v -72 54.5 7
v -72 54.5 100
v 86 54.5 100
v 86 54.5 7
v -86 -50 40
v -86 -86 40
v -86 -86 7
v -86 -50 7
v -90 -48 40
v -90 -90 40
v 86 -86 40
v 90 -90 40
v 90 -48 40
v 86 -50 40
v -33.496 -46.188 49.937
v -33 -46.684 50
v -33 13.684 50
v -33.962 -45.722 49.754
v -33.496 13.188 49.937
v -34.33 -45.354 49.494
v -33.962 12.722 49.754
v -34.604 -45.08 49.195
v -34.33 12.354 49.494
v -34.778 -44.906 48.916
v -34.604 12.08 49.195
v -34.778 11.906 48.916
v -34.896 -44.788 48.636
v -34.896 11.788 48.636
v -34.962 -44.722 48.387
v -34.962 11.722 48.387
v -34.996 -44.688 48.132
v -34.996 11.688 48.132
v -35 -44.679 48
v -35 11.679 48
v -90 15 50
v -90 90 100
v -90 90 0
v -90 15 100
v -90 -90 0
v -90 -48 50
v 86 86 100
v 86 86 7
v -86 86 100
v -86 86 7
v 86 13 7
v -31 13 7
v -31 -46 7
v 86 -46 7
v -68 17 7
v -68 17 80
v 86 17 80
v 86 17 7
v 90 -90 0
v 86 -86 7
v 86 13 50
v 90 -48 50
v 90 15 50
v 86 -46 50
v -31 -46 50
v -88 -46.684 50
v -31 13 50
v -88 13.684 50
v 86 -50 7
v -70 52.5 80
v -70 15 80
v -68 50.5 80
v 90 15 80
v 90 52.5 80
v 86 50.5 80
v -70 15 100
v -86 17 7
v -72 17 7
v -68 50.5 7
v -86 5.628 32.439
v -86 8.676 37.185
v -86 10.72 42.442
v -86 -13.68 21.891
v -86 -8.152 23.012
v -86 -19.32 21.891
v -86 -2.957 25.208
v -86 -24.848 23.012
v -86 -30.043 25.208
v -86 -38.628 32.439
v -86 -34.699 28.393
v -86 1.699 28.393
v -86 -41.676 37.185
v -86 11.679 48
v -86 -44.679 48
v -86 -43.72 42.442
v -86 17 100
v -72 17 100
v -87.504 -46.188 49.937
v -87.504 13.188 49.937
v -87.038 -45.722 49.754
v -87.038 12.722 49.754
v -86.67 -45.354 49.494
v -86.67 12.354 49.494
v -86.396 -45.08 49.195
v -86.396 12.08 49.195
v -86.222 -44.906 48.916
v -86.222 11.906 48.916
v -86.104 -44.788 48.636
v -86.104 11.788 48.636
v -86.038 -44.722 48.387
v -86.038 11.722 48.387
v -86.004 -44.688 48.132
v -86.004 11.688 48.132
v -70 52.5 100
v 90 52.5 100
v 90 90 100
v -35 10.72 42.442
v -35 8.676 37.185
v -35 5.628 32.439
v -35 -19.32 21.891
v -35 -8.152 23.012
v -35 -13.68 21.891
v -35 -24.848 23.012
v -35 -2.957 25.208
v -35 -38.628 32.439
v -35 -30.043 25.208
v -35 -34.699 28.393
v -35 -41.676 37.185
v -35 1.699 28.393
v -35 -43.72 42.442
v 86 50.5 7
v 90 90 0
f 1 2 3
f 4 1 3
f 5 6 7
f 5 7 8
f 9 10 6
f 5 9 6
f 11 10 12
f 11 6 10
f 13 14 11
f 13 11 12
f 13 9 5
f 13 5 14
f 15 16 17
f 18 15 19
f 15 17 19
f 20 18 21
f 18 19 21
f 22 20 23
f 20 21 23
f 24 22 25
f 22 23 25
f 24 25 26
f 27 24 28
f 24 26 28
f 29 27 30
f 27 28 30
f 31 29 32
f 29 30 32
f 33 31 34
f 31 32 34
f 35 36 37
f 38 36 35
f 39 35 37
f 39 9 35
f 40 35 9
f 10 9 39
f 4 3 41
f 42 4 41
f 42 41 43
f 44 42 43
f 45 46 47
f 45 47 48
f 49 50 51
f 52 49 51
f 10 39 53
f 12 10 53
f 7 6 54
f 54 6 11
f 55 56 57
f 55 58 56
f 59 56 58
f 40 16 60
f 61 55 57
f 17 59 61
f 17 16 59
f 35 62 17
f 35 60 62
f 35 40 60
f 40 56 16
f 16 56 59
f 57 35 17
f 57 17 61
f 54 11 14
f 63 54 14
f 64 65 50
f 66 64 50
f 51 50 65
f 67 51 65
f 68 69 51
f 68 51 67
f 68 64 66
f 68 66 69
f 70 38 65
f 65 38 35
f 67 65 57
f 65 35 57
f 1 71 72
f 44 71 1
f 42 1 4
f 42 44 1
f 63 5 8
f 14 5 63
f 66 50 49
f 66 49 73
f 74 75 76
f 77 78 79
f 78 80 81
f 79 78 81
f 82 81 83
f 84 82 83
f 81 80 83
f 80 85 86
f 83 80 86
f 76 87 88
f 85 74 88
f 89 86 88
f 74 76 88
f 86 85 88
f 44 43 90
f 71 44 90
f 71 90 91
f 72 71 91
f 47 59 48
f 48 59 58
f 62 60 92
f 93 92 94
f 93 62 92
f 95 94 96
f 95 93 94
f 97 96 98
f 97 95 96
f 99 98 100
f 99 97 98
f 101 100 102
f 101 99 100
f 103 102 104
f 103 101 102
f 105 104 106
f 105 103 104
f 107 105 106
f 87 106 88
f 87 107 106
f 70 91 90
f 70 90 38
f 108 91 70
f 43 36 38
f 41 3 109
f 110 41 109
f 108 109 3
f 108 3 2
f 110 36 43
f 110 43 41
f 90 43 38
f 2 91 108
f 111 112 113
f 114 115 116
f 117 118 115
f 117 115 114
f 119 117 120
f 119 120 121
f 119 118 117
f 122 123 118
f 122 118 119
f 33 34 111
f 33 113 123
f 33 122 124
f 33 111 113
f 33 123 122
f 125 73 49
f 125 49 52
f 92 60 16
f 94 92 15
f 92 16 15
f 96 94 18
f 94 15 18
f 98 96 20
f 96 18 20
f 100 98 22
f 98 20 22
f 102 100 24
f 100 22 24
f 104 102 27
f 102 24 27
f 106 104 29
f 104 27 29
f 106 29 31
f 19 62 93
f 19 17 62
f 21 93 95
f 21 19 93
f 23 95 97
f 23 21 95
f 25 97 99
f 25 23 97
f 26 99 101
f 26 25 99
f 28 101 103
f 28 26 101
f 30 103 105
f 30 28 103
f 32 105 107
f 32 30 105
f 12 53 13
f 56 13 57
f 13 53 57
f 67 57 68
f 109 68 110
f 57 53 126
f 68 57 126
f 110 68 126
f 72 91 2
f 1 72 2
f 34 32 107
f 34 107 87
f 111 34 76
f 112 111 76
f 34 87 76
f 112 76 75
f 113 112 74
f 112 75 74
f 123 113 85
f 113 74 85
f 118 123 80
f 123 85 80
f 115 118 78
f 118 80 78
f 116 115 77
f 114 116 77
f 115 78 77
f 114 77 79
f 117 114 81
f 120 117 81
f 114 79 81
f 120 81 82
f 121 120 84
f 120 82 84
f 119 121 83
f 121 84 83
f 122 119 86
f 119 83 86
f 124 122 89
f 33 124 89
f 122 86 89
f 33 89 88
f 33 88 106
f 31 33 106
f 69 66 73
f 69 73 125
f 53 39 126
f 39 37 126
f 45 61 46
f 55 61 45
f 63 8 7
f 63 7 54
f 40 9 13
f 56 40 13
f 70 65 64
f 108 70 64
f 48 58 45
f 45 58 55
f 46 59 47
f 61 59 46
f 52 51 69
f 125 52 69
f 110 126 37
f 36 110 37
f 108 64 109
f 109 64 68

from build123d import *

# Parameters (mm, degrees)
F0_W      = 70
F0_H      = 37.5
F0_W_2    = 90
F1_DEPTH  = 100
F2_DEPTH  = 80
F3_DEPTH  = 50
F0_W_3    = 180
F0_H_2    = 42
F4_DEPTH  = 40
F7_DEPTH  = 55
F8_DEPTH  = 4
F10_R     = 2
F11_W     = 154
F11_H     = 33.5
F11_W_2   = 117
F11_H_2   = 59
F11_W_3   = 172
F11_H_3   = 36
F12_DEPTH = 93


with BuildPart() as f1:
    # F0 (on Top) → F1 (new body)
    with BuildSketch(Plane.XY):
        with Locations((-35, 71.25)):
            Rectangle(F0_W, F0_H)
        with Locations((45, 71.25)):
            Rectangle(F0_W_2, F0_H)
        Polygon((-70, 52.5), (-70, 90), (-90, 90), (-90, 15), (-70, 15), align=None)
    extrude(amount=F1_DEPTH)

    # F0 (on Top) → F2 (join)
    with BuildSketch(Plane.XY):
        with Locations((-35, 33.75)):
            Rectangle(F0_W, F0_H)
        with Locations((45, 33.75)):
            Rectangle(F0_W_2, F0_H)
    extrude(amount=F2_DEPTH)

    # F0 (on Top) → F3 (join)
    with BuildSketch(Plane.XY):
        Polygon((90, -48), (90, 15), (0, 15), (-70, 15), (-90, 15), (-90, -48), align=None)
    extrude(amount=F3_DEPTH)

    # F0 (on Top) → F4 (join)
    with BuildSketch(Plane.XY):
        with Locations((0, -69)):
            Rectangle(F0_W_3, F0_H_2)
    extrude(amount=F4_DEPTH)

    # F6 (on face) → F7 (cut)
    with BuildSketch(Plane(origin=(-90, 0, 0), x_dir=(0, -1, 0), z_dir=(-1, 0, 0))):
        with BuildLine():
            ThreePointArc((-11.75, 50), (16.5, 21.75), (44.75, 50))
            Line((44.75, 50), (-11.75, 50))
        make_face()
    extrude(amount=-F7_DEPTH, mode=Mode.SUBTRACT)

    # F6 (on face) → F8 (join)
    with BuildSketch(Plane(origin=(-90, 0, 0), x_dir=(0, -1, 0), z_dir=(-1, 0, 0))):
        with BuildLine():
            ThreePointArc((-11.75, 50), (16.5, 21.75), (44.75, 50))
            Line((44.75, 50), (-11.75, 50))
        make_face()
    extrude(amount=-F8_DEPTH)

    # F10
    f10_edges = [f1.edges().sort_by_distance(p)[0] for p in [
        (-60.5, 11.75, 50),
        (-35, -16.5, 50),
        (-60.5, -44.75, 50),
        (-86, -16.5, 50),
    ]]
    fillet(f10_edges, radius=F10_R)

    # F11 (on offset) → F12 (cut)
    with BuildSketch(Plane.XY.offset(100)):
        Polygon((-86, 17), (-72, 17), (-72, 52.5), (-72, 54.5), (-70, 54.5), (86, 54.5), (86, 86), (-86, 86), align=None)
        with Locations((9, 33.75)):
            Rectangle(F11_W, F11_H)
        with Locations((27.5, -16.5)):
            Rectangle(F11_W_2, F11_H_2)
        with Locations((0, -68)):
            Rectangle(F11_W_3, F11_H_3)
    extrude(amount=-F12_DEPTH, mode=Mode.SUBTRACT)


solid = f1.part
